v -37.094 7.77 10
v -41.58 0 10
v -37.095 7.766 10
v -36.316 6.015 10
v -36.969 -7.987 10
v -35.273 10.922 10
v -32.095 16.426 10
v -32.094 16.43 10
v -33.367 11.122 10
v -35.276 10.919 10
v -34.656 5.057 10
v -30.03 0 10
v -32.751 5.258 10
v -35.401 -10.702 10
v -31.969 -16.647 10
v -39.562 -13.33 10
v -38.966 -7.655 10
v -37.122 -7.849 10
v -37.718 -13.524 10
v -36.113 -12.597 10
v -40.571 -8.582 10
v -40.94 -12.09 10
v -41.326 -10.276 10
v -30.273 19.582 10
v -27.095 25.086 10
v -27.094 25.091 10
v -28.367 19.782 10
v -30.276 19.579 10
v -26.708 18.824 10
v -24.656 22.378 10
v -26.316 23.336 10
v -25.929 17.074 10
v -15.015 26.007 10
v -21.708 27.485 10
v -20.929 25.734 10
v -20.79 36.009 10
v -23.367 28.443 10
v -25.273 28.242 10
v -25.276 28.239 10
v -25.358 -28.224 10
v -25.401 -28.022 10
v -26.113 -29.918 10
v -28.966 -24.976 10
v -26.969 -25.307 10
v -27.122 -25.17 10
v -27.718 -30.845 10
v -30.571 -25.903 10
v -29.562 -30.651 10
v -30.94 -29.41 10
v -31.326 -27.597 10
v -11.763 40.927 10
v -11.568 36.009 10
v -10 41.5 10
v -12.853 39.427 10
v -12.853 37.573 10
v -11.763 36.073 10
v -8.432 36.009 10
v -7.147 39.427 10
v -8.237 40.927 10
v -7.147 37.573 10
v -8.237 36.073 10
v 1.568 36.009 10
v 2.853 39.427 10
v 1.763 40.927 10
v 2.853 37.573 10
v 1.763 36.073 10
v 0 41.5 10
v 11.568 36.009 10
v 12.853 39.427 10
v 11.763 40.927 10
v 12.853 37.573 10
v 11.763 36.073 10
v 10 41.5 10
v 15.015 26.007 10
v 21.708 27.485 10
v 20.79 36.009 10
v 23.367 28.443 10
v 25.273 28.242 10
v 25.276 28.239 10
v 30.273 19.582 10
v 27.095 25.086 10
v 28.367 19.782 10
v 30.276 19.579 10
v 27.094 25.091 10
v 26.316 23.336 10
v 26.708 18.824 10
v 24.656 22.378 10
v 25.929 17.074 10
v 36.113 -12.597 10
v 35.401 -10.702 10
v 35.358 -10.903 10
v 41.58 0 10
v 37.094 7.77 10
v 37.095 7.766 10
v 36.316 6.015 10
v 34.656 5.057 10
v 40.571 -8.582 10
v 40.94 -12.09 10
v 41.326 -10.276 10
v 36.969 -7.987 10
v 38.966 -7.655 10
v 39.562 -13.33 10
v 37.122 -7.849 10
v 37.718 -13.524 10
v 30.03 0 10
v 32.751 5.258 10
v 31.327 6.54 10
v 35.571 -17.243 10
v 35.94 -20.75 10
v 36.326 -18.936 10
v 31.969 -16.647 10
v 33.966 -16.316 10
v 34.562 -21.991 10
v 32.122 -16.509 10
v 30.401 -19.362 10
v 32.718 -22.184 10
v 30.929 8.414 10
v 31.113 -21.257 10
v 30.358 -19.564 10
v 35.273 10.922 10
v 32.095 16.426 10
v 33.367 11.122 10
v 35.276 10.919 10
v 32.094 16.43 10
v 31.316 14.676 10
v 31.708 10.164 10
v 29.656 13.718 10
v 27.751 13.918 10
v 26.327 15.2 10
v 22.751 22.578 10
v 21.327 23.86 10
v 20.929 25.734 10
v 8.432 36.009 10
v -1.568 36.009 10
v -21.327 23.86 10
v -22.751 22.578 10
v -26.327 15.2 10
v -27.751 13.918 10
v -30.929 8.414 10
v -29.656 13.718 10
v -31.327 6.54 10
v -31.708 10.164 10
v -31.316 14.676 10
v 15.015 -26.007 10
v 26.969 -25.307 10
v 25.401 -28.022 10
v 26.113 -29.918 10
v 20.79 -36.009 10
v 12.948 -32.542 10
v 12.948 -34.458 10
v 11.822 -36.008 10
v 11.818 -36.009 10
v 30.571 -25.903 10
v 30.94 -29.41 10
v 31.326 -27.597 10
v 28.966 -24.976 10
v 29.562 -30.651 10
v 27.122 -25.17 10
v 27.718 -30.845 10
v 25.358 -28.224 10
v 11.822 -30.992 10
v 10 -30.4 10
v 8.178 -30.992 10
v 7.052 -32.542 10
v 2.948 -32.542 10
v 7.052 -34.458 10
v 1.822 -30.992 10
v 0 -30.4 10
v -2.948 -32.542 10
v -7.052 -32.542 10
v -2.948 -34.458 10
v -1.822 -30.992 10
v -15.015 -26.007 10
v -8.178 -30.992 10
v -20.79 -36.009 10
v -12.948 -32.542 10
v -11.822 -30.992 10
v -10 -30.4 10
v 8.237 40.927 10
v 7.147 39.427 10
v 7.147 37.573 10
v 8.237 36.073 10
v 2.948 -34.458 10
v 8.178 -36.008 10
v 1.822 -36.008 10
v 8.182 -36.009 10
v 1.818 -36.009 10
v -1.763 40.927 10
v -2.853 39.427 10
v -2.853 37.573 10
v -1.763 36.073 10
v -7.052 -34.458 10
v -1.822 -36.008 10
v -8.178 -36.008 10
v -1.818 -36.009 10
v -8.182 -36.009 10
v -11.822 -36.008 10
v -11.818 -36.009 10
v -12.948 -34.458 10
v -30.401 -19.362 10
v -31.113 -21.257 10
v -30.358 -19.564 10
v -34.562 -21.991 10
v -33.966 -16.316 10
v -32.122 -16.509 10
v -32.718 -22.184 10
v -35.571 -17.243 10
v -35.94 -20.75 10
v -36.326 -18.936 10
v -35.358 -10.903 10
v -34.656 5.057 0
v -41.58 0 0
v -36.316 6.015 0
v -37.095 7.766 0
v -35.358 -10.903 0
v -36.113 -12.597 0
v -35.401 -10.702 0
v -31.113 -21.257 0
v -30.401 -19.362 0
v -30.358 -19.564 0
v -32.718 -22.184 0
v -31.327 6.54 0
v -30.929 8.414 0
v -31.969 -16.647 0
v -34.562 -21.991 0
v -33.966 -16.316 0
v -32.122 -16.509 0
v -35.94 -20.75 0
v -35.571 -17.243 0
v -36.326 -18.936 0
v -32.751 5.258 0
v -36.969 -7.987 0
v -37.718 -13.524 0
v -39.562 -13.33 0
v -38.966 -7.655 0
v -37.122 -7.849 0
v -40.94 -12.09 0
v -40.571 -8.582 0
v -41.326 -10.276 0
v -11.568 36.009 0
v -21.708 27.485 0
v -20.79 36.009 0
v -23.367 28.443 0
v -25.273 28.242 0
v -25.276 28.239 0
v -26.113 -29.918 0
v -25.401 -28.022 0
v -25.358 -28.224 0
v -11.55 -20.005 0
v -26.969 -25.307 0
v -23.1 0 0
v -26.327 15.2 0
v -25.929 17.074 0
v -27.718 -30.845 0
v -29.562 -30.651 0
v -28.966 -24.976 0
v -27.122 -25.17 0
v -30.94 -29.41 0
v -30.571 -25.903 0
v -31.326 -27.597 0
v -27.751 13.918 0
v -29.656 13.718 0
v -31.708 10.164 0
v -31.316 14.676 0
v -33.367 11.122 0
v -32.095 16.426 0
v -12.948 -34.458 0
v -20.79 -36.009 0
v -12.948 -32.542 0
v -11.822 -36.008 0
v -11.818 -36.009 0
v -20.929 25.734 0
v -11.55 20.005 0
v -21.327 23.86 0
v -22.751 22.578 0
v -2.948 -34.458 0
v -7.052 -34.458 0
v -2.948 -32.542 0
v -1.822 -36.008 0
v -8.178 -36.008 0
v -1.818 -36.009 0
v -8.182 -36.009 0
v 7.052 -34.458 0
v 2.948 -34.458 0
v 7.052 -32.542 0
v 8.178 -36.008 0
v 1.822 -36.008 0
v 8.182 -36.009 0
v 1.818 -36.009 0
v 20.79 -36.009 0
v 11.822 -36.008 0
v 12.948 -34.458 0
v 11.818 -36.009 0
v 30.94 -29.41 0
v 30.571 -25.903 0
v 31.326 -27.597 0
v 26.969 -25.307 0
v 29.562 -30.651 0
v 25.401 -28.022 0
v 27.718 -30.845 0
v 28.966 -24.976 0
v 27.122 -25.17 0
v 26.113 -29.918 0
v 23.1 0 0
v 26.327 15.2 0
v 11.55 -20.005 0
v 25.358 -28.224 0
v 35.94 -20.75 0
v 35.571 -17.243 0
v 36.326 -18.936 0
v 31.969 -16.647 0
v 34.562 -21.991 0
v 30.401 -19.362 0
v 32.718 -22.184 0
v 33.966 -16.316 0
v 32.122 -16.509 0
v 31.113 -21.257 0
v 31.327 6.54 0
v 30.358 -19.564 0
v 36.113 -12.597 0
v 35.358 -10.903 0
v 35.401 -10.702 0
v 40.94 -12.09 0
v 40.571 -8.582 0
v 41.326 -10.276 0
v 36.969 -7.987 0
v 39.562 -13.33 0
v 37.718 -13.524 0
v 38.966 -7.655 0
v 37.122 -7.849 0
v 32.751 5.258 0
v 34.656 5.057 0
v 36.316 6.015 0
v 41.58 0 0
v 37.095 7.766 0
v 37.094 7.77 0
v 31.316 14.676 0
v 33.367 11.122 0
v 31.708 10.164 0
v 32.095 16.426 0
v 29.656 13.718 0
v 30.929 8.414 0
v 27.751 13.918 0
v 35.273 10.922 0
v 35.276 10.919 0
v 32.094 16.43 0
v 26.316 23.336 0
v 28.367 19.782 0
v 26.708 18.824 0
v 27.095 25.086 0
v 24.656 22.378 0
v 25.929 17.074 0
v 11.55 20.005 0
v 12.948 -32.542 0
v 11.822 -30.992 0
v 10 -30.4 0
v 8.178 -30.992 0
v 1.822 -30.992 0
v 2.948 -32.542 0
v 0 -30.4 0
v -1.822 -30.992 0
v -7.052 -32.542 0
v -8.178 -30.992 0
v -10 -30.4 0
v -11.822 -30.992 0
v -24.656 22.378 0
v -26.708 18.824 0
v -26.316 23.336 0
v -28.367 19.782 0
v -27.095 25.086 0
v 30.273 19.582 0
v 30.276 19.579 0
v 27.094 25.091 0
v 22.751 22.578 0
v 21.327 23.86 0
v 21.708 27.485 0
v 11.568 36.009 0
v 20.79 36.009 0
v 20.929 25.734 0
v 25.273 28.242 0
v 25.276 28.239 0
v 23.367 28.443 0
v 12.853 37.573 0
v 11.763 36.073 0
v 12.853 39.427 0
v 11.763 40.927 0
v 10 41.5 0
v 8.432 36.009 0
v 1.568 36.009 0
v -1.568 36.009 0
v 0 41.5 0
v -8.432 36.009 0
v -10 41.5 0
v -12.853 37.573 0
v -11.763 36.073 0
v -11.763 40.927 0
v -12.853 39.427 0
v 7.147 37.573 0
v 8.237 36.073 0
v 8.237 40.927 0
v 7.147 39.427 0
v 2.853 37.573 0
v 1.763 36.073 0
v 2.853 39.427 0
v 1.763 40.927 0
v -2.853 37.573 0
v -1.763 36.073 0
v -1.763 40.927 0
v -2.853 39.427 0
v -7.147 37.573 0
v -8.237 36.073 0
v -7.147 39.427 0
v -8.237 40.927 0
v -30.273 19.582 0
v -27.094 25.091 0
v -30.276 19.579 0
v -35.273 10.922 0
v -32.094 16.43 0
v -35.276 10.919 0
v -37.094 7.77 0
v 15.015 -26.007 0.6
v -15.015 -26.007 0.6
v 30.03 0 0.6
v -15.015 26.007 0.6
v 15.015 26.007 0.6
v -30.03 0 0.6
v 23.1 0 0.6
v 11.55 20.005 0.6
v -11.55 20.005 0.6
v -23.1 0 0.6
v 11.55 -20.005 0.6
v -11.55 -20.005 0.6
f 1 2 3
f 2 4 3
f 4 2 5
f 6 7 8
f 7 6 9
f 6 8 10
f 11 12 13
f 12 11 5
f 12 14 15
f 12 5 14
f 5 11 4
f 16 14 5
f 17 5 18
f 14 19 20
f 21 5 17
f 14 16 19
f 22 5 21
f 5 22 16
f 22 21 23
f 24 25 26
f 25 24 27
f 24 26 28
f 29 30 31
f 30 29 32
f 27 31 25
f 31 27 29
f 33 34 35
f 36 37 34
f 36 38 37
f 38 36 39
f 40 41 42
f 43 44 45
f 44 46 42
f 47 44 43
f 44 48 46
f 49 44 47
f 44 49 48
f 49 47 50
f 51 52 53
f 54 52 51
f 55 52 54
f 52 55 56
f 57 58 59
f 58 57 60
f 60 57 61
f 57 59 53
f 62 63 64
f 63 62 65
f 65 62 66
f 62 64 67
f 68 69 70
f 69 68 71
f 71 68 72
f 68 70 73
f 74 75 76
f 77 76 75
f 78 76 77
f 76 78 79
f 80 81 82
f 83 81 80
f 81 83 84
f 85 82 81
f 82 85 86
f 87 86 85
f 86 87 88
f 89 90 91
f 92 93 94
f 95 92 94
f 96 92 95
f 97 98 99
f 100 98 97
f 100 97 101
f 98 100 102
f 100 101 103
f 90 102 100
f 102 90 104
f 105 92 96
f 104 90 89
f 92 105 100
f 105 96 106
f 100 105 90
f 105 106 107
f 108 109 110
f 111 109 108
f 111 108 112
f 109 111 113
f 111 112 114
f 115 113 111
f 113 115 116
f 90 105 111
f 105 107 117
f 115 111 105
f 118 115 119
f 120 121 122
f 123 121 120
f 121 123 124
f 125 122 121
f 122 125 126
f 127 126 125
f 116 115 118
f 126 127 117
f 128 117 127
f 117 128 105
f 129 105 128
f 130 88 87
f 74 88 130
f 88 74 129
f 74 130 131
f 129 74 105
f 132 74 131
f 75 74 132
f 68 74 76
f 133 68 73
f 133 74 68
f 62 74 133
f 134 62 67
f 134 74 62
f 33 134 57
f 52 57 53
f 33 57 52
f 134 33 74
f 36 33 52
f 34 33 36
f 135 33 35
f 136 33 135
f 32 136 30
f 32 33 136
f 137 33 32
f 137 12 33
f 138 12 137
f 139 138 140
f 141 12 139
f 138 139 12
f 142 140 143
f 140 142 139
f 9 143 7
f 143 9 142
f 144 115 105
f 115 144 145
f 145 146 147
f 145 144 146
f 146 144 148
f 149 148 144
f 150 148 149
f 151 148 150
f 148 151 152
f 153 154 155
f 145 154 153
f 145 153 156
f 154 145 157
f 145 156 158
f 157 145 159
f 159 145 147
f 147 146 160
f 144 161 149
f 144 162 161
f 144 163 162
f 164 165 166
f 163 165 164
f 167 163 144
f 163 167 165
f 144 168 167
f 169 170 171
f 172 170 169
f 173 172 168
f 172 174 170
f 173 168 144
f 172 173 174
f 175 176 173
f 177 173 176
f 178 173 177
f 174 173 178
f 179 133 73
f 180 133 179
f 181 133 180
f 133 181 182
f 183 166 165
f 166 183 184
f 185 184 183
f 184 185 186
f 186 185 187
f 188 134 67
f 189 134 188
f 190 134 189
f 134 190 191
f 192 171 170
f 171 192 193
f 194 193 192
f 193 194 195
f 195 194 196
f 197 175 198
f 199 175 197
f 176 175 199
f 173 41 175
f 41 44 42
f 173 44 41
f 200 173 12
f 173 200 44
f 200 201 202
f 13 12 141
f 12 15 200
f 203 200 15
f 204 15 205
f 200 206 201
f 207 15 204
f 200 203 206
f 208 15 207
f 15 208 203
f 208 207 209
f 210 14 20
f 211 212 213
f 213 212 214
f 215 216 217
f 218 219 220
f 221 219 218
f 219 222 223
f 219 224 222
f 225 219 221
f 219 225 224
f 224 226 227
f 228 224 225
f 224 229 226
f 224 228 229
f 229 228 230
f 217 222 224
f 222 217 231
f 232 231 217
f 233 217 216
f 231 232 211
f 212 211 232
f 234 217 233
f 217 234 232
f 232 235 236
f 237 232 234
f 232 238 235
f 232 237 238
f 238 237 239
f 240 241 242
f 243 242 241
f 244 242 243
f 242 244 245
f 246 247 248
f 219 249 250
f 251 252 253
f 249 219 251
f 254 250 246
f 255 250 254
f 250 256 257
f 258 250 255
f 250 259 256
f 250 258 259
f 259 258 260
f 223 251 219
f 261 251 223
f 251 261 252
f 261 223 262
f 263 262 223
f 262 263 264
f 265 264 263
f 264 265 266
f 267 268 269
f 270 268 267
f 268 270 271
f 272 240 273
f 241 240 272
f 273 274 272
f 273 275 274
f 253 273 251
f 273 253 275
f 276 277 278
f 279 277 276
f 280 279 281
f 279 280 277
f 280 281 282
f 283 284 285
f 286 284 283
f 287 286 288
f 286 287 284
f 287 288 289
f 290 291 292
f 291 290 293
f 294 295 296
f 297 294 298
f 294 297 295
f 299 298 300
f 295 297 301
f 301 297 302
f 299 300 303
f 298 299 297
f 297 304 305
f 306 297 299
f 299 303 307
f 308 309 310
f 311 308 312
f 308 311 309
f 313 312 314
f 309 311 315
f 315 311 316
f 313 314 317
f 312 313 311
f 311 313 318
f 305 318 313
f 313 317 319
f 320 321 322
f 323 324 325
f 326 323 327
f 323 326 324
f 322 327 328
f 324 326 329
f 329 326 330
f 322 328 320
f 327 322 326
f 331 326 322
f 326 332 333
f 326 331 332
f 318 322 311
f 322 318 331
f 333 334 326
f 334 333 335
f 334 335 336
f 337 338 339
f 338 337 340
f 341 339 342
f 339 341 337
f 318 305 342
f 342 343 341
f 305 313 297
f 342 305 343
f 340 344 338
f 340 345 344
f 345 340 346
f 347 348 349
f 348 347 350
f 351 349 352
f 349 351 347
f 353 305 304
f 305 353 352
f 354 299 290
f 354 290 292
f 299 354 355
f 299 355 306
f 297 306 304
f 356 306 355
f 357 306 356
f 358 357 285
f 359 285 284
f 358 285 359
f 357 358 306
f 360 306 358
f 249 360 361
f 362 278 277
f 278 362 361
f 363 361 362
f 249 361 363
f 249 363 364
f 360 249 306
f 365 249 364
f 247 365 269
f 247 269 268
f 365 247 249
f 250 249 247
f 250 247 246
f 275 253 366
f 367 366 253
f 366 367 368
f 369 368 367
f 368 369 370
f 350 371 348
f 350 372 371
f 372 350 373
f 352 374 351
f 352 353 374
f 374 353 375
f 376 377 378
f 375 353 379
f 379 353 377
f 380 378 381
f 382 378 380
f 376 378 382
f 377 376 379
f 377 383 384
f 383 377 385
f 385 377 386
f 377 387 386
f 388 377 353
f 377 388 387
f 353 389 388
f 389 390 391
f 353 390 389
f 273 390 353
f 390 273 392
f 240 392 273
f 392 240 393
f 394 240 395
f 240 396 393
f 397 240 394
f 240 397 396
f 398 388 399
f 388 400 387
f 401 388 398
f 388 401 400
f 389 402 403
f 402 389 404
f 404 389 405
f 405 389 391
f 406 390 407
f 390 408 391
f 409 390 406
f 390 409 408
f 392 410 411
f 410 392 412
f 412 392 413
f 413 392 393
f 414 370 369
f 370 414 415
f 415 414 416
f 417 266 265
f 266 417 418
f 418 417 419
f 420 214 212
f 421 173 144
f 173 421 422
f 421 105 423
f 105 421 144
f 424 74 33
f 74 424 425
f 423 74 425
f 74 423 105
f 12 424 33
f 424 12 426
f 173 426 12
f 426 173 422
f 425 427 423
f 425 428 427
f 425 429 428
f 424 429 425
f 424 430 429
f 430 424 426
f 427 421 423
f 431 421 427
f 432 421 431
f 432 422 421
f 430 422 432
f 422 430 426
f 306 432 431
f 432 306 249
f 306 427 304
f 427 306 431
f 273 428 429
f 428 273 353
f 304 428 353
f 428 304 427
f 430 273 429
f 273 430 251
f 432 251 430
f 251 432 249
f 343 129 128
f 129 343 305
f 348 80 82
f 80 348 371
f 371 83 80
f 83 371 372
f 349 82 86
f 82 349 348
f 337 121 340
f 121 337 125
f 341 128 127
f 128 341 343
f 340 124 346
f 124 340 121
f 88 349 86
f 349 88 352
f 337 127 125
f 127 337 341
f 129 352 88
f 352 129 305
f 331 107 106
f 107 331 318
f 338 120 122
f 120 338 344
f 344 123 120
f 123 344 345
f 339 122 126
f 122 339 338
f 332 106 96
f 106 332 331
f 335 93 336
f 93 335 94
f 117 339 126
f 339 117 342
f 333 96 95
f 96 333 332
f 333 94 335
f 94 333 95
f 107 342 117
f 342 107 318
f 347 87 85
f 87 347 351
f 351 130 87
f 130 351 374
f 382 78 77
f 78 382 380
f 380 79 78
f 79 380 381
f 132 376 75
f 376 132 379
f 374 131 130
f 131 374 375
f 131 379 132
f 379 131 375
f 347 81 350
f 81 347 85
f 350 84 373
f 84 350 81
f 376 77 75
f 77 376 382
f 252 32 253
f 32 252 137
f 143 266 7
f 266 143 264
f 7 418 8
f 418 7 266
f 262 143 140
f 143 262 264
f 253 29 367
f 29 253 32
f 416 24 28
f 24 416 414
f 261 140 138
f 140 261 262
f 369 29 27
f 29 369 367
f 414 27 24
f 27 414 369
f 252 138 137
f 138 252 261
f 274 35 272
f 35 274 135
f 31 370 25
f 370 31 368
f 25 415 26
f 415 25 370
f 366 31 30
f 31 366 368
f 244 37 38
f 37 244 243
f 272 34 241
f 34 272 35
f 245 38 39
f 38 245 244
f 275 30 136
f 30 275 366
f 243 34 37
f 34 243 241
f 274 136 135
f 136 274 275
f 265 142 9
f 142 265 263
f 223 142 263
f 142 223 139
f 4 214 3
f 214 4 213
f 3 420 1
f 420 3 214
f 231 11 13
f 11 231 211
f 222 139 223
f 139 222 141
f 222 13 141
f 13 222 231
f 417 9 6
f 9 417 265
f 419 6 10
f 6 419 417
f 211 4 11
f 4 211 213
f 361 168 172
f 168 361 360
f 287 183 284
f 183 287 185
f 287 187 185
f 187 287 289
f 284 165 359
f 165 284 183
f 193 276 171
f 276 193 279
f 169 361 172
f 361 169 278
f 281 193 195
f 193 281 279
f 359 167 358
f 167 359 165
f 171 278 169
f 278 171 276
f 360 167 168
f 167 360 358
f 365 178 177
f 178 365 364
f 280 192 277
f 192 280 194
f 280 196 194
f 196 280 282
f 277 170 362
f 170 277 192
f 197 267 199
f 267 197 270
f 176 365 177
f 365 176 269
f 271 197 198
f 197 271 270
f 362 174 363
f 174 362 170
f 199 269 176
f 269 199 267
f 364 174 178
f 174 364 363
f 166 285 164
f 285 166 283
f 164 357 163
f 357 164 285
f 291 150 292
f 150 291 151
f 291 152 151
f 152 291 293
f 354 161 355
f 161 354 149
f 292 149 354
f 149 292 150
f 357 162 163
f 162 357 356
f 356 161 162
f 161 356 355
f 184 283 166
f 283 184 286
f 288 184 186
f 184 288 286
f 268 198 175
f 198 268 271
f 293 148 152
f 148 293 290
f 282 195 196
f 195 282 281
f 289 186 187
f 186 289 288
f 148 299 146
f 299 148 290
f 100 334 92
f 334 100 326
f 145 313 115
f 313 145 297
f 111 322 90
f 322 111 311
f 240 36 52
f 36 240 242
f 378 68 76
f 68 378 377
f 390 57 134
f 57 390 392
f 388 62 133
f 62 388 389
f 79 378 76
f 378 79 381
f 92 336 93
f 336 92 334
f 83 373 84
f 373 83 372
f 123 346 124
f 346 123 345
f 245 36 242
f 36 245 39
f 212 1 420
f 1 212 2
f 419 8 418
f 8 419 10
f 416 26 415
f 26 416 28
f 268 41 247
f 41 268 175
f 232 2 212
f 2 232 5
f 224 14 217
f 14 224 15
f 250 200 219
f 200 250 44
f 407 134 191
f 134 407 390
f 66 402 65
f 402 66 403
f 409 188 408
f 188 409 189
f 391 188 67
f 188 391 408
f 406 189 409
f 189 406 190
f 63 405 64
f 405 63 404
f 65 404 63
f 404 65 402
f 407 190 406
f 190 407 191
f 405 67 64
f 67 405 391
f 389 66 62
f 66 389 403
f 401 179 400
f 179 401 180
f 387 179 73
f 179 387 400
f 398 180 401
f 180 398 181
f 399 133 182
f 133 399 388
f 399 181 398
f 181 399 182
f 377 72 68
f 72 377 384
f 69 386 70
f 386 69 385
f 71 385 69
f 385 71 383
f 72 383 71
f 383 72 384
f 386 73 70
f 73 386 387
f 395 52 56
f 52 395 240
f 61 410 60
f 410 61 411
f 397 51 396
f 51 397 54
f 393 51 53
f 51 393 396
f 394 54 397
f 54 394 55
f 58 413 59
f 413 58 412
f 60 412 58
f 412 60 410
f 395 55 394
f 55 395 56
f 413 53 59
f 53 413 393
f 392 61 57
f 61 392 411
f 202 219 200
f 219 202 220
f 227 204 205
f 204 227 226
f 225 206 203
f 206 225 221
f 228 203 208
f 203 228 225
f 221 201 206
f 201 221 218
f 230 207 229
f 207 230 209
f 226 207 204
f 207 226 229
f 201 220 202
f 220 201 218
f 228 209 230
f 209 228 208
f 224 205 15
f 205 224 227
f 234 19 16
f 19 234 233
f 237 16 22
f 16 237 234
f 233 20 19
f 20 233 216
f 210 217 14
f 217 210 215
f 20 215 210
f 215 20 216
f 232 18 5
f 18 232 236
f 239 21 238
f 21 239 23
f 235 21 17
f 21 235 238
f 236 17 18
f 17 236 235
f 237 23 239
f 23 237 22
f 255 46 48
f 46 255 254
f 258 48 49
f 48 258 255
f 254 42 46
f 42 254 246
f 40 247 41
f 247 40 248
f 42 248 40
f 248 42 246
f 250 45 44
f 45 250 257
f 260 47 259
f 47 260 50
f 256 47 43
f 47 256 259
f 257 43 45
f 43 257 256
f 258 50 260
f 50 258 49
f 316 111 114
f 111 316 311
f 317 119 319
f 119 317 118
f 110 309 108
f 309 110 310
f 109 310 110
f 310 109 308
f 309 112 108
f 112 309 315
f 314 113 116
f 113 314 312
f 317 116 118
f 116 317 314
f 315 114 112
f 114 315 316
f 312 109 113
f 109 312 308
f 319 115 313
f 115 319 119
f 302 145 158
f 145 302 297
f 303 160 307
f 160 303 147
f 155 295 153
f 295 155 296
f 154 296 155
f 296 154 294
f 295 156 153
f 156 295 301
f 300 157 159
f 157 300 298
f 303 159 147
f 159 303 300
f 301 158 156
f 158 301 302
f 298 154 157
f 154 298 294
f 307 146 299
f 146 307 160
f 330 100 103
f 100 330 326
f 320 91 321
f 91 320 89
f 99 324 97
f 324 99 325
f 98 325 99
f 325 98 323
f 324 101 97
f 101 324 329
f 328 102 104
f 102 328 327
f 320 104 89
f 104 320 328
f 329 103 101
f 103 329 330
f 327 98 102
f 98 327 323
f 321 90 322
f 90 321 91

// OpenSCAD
$shell_hex=30;
$shell_height=10;
$wall=4;
$wall_gap=0.25;
$base_hex_hole=20;

$end_block=0.6;


module hex_cylinder(r_in, h_in) {
    r_in = r_in*1.155;
    cylinder(r=r_in, h_in, $fn=6);
}

module interlock_shell() {
    union() {
        difference() {
            hex_cylinder($shell_hex+6, $shell_height);
            hex_cylinder($shell_hex, $shell_height);
            for ($edge = [0:2]) {
                rotate([0,0,30+$edge*120]) {
                    translate([33.5,0,0]) {
                        cylinder(r=3.1, h=90);
                    }
                    translate([33.5,-10,0]) {
                        cylinder(r=3.1, h=90);
                    }
                     translate([33.5,10,0]) {
                        cylinder(r=3.1, h=90);
                    }
                }
            }
        }
        for ($edge = [0:2]) {
            rotate([0,0,90+$edge*120]) {
                translate([38.5,0,0]) {
                    cylinder(r=3, h=$shell_height);
                }
                translate([38.5,-10,0]) {
                    cylinder(r=3, h=$shell_height);
                }
                 translate([38.5,10,0]) {
                    cylinder(r=3, h=$shell_height);
                }
            }
        }
    }
}

module shell() {
    difference() {
        hex_cylinder($shell_hex, $shell_height);
        translate([0,0,$end_block]) {
            hex_cylinder($shell_hex-$wall, $shell_height);
        }
        translate([0,0,-1]) {
            hex_cylinder($base_hex_hole, 3);
        }
    }
}


module drawer() {
    union() {
        difference() {
            hex_cylinder($shell_hex-$wall-$wall_gap, $shell_height);
            translate([0,0, $wall +0.1]) {
                hex_cylinder($shell_hex-(2*$wall)-$wall_gap, $shell_height-$wall*2);
            }
            translate([-19,-46,$wall]) {
                rotate([0,0,30]) {
                    cube([$shell_hex*1.3, 2*$shell_hex+1.3, $shell_height-2*$wall]);
                }
            }
       }
    }
    translate([5,4, $shell_height-$wall-2]) {
        rotate([0,0,-60]) {
            union () {
                hull() {
                    translate([-10,0,3]) {
                        cylinder(r=4, h=13);
                    }
                    translate([10,0,3]) {
                        cylinder(r=4, h=13);
                    }
                    translate([8,10,12]) {
                        cylinder(r=4, h=5);           
                    }
                    translate([-8,10,12]) {
                        cylinder(r=4, h=5);           
                    }
                   
                }
                hull() {
                    translate([8,10,12]) {
                        cylinder(r=4, h=5);           
                    }
                    translate([-8,10,12]) {
                        cylinder(r=4, h=5);           
                    }
                    translate([8,14,11.5]) {
                        cylinder(r=4, h=5.5);           
                    }
                    translate([-8,14,11.5]) {
                        cylinder(r=4, h=5.5);           
                    }                 
                }
            }
        }
    }
}




$shell = 1;

if ($shell) {
    shell();
    interlock_shell();
} else {
    translate([0,0,$shell_hex-$wall]) {
        rotate([-30,0,0]) {
            rotate([0,90,0]) {
                drawer();
            }
        }
    }
}

/*
rotate([0,0,30]) {
    translate([-50,0,-2]) {
        cube([100,10,5]);
    }
}
*/
